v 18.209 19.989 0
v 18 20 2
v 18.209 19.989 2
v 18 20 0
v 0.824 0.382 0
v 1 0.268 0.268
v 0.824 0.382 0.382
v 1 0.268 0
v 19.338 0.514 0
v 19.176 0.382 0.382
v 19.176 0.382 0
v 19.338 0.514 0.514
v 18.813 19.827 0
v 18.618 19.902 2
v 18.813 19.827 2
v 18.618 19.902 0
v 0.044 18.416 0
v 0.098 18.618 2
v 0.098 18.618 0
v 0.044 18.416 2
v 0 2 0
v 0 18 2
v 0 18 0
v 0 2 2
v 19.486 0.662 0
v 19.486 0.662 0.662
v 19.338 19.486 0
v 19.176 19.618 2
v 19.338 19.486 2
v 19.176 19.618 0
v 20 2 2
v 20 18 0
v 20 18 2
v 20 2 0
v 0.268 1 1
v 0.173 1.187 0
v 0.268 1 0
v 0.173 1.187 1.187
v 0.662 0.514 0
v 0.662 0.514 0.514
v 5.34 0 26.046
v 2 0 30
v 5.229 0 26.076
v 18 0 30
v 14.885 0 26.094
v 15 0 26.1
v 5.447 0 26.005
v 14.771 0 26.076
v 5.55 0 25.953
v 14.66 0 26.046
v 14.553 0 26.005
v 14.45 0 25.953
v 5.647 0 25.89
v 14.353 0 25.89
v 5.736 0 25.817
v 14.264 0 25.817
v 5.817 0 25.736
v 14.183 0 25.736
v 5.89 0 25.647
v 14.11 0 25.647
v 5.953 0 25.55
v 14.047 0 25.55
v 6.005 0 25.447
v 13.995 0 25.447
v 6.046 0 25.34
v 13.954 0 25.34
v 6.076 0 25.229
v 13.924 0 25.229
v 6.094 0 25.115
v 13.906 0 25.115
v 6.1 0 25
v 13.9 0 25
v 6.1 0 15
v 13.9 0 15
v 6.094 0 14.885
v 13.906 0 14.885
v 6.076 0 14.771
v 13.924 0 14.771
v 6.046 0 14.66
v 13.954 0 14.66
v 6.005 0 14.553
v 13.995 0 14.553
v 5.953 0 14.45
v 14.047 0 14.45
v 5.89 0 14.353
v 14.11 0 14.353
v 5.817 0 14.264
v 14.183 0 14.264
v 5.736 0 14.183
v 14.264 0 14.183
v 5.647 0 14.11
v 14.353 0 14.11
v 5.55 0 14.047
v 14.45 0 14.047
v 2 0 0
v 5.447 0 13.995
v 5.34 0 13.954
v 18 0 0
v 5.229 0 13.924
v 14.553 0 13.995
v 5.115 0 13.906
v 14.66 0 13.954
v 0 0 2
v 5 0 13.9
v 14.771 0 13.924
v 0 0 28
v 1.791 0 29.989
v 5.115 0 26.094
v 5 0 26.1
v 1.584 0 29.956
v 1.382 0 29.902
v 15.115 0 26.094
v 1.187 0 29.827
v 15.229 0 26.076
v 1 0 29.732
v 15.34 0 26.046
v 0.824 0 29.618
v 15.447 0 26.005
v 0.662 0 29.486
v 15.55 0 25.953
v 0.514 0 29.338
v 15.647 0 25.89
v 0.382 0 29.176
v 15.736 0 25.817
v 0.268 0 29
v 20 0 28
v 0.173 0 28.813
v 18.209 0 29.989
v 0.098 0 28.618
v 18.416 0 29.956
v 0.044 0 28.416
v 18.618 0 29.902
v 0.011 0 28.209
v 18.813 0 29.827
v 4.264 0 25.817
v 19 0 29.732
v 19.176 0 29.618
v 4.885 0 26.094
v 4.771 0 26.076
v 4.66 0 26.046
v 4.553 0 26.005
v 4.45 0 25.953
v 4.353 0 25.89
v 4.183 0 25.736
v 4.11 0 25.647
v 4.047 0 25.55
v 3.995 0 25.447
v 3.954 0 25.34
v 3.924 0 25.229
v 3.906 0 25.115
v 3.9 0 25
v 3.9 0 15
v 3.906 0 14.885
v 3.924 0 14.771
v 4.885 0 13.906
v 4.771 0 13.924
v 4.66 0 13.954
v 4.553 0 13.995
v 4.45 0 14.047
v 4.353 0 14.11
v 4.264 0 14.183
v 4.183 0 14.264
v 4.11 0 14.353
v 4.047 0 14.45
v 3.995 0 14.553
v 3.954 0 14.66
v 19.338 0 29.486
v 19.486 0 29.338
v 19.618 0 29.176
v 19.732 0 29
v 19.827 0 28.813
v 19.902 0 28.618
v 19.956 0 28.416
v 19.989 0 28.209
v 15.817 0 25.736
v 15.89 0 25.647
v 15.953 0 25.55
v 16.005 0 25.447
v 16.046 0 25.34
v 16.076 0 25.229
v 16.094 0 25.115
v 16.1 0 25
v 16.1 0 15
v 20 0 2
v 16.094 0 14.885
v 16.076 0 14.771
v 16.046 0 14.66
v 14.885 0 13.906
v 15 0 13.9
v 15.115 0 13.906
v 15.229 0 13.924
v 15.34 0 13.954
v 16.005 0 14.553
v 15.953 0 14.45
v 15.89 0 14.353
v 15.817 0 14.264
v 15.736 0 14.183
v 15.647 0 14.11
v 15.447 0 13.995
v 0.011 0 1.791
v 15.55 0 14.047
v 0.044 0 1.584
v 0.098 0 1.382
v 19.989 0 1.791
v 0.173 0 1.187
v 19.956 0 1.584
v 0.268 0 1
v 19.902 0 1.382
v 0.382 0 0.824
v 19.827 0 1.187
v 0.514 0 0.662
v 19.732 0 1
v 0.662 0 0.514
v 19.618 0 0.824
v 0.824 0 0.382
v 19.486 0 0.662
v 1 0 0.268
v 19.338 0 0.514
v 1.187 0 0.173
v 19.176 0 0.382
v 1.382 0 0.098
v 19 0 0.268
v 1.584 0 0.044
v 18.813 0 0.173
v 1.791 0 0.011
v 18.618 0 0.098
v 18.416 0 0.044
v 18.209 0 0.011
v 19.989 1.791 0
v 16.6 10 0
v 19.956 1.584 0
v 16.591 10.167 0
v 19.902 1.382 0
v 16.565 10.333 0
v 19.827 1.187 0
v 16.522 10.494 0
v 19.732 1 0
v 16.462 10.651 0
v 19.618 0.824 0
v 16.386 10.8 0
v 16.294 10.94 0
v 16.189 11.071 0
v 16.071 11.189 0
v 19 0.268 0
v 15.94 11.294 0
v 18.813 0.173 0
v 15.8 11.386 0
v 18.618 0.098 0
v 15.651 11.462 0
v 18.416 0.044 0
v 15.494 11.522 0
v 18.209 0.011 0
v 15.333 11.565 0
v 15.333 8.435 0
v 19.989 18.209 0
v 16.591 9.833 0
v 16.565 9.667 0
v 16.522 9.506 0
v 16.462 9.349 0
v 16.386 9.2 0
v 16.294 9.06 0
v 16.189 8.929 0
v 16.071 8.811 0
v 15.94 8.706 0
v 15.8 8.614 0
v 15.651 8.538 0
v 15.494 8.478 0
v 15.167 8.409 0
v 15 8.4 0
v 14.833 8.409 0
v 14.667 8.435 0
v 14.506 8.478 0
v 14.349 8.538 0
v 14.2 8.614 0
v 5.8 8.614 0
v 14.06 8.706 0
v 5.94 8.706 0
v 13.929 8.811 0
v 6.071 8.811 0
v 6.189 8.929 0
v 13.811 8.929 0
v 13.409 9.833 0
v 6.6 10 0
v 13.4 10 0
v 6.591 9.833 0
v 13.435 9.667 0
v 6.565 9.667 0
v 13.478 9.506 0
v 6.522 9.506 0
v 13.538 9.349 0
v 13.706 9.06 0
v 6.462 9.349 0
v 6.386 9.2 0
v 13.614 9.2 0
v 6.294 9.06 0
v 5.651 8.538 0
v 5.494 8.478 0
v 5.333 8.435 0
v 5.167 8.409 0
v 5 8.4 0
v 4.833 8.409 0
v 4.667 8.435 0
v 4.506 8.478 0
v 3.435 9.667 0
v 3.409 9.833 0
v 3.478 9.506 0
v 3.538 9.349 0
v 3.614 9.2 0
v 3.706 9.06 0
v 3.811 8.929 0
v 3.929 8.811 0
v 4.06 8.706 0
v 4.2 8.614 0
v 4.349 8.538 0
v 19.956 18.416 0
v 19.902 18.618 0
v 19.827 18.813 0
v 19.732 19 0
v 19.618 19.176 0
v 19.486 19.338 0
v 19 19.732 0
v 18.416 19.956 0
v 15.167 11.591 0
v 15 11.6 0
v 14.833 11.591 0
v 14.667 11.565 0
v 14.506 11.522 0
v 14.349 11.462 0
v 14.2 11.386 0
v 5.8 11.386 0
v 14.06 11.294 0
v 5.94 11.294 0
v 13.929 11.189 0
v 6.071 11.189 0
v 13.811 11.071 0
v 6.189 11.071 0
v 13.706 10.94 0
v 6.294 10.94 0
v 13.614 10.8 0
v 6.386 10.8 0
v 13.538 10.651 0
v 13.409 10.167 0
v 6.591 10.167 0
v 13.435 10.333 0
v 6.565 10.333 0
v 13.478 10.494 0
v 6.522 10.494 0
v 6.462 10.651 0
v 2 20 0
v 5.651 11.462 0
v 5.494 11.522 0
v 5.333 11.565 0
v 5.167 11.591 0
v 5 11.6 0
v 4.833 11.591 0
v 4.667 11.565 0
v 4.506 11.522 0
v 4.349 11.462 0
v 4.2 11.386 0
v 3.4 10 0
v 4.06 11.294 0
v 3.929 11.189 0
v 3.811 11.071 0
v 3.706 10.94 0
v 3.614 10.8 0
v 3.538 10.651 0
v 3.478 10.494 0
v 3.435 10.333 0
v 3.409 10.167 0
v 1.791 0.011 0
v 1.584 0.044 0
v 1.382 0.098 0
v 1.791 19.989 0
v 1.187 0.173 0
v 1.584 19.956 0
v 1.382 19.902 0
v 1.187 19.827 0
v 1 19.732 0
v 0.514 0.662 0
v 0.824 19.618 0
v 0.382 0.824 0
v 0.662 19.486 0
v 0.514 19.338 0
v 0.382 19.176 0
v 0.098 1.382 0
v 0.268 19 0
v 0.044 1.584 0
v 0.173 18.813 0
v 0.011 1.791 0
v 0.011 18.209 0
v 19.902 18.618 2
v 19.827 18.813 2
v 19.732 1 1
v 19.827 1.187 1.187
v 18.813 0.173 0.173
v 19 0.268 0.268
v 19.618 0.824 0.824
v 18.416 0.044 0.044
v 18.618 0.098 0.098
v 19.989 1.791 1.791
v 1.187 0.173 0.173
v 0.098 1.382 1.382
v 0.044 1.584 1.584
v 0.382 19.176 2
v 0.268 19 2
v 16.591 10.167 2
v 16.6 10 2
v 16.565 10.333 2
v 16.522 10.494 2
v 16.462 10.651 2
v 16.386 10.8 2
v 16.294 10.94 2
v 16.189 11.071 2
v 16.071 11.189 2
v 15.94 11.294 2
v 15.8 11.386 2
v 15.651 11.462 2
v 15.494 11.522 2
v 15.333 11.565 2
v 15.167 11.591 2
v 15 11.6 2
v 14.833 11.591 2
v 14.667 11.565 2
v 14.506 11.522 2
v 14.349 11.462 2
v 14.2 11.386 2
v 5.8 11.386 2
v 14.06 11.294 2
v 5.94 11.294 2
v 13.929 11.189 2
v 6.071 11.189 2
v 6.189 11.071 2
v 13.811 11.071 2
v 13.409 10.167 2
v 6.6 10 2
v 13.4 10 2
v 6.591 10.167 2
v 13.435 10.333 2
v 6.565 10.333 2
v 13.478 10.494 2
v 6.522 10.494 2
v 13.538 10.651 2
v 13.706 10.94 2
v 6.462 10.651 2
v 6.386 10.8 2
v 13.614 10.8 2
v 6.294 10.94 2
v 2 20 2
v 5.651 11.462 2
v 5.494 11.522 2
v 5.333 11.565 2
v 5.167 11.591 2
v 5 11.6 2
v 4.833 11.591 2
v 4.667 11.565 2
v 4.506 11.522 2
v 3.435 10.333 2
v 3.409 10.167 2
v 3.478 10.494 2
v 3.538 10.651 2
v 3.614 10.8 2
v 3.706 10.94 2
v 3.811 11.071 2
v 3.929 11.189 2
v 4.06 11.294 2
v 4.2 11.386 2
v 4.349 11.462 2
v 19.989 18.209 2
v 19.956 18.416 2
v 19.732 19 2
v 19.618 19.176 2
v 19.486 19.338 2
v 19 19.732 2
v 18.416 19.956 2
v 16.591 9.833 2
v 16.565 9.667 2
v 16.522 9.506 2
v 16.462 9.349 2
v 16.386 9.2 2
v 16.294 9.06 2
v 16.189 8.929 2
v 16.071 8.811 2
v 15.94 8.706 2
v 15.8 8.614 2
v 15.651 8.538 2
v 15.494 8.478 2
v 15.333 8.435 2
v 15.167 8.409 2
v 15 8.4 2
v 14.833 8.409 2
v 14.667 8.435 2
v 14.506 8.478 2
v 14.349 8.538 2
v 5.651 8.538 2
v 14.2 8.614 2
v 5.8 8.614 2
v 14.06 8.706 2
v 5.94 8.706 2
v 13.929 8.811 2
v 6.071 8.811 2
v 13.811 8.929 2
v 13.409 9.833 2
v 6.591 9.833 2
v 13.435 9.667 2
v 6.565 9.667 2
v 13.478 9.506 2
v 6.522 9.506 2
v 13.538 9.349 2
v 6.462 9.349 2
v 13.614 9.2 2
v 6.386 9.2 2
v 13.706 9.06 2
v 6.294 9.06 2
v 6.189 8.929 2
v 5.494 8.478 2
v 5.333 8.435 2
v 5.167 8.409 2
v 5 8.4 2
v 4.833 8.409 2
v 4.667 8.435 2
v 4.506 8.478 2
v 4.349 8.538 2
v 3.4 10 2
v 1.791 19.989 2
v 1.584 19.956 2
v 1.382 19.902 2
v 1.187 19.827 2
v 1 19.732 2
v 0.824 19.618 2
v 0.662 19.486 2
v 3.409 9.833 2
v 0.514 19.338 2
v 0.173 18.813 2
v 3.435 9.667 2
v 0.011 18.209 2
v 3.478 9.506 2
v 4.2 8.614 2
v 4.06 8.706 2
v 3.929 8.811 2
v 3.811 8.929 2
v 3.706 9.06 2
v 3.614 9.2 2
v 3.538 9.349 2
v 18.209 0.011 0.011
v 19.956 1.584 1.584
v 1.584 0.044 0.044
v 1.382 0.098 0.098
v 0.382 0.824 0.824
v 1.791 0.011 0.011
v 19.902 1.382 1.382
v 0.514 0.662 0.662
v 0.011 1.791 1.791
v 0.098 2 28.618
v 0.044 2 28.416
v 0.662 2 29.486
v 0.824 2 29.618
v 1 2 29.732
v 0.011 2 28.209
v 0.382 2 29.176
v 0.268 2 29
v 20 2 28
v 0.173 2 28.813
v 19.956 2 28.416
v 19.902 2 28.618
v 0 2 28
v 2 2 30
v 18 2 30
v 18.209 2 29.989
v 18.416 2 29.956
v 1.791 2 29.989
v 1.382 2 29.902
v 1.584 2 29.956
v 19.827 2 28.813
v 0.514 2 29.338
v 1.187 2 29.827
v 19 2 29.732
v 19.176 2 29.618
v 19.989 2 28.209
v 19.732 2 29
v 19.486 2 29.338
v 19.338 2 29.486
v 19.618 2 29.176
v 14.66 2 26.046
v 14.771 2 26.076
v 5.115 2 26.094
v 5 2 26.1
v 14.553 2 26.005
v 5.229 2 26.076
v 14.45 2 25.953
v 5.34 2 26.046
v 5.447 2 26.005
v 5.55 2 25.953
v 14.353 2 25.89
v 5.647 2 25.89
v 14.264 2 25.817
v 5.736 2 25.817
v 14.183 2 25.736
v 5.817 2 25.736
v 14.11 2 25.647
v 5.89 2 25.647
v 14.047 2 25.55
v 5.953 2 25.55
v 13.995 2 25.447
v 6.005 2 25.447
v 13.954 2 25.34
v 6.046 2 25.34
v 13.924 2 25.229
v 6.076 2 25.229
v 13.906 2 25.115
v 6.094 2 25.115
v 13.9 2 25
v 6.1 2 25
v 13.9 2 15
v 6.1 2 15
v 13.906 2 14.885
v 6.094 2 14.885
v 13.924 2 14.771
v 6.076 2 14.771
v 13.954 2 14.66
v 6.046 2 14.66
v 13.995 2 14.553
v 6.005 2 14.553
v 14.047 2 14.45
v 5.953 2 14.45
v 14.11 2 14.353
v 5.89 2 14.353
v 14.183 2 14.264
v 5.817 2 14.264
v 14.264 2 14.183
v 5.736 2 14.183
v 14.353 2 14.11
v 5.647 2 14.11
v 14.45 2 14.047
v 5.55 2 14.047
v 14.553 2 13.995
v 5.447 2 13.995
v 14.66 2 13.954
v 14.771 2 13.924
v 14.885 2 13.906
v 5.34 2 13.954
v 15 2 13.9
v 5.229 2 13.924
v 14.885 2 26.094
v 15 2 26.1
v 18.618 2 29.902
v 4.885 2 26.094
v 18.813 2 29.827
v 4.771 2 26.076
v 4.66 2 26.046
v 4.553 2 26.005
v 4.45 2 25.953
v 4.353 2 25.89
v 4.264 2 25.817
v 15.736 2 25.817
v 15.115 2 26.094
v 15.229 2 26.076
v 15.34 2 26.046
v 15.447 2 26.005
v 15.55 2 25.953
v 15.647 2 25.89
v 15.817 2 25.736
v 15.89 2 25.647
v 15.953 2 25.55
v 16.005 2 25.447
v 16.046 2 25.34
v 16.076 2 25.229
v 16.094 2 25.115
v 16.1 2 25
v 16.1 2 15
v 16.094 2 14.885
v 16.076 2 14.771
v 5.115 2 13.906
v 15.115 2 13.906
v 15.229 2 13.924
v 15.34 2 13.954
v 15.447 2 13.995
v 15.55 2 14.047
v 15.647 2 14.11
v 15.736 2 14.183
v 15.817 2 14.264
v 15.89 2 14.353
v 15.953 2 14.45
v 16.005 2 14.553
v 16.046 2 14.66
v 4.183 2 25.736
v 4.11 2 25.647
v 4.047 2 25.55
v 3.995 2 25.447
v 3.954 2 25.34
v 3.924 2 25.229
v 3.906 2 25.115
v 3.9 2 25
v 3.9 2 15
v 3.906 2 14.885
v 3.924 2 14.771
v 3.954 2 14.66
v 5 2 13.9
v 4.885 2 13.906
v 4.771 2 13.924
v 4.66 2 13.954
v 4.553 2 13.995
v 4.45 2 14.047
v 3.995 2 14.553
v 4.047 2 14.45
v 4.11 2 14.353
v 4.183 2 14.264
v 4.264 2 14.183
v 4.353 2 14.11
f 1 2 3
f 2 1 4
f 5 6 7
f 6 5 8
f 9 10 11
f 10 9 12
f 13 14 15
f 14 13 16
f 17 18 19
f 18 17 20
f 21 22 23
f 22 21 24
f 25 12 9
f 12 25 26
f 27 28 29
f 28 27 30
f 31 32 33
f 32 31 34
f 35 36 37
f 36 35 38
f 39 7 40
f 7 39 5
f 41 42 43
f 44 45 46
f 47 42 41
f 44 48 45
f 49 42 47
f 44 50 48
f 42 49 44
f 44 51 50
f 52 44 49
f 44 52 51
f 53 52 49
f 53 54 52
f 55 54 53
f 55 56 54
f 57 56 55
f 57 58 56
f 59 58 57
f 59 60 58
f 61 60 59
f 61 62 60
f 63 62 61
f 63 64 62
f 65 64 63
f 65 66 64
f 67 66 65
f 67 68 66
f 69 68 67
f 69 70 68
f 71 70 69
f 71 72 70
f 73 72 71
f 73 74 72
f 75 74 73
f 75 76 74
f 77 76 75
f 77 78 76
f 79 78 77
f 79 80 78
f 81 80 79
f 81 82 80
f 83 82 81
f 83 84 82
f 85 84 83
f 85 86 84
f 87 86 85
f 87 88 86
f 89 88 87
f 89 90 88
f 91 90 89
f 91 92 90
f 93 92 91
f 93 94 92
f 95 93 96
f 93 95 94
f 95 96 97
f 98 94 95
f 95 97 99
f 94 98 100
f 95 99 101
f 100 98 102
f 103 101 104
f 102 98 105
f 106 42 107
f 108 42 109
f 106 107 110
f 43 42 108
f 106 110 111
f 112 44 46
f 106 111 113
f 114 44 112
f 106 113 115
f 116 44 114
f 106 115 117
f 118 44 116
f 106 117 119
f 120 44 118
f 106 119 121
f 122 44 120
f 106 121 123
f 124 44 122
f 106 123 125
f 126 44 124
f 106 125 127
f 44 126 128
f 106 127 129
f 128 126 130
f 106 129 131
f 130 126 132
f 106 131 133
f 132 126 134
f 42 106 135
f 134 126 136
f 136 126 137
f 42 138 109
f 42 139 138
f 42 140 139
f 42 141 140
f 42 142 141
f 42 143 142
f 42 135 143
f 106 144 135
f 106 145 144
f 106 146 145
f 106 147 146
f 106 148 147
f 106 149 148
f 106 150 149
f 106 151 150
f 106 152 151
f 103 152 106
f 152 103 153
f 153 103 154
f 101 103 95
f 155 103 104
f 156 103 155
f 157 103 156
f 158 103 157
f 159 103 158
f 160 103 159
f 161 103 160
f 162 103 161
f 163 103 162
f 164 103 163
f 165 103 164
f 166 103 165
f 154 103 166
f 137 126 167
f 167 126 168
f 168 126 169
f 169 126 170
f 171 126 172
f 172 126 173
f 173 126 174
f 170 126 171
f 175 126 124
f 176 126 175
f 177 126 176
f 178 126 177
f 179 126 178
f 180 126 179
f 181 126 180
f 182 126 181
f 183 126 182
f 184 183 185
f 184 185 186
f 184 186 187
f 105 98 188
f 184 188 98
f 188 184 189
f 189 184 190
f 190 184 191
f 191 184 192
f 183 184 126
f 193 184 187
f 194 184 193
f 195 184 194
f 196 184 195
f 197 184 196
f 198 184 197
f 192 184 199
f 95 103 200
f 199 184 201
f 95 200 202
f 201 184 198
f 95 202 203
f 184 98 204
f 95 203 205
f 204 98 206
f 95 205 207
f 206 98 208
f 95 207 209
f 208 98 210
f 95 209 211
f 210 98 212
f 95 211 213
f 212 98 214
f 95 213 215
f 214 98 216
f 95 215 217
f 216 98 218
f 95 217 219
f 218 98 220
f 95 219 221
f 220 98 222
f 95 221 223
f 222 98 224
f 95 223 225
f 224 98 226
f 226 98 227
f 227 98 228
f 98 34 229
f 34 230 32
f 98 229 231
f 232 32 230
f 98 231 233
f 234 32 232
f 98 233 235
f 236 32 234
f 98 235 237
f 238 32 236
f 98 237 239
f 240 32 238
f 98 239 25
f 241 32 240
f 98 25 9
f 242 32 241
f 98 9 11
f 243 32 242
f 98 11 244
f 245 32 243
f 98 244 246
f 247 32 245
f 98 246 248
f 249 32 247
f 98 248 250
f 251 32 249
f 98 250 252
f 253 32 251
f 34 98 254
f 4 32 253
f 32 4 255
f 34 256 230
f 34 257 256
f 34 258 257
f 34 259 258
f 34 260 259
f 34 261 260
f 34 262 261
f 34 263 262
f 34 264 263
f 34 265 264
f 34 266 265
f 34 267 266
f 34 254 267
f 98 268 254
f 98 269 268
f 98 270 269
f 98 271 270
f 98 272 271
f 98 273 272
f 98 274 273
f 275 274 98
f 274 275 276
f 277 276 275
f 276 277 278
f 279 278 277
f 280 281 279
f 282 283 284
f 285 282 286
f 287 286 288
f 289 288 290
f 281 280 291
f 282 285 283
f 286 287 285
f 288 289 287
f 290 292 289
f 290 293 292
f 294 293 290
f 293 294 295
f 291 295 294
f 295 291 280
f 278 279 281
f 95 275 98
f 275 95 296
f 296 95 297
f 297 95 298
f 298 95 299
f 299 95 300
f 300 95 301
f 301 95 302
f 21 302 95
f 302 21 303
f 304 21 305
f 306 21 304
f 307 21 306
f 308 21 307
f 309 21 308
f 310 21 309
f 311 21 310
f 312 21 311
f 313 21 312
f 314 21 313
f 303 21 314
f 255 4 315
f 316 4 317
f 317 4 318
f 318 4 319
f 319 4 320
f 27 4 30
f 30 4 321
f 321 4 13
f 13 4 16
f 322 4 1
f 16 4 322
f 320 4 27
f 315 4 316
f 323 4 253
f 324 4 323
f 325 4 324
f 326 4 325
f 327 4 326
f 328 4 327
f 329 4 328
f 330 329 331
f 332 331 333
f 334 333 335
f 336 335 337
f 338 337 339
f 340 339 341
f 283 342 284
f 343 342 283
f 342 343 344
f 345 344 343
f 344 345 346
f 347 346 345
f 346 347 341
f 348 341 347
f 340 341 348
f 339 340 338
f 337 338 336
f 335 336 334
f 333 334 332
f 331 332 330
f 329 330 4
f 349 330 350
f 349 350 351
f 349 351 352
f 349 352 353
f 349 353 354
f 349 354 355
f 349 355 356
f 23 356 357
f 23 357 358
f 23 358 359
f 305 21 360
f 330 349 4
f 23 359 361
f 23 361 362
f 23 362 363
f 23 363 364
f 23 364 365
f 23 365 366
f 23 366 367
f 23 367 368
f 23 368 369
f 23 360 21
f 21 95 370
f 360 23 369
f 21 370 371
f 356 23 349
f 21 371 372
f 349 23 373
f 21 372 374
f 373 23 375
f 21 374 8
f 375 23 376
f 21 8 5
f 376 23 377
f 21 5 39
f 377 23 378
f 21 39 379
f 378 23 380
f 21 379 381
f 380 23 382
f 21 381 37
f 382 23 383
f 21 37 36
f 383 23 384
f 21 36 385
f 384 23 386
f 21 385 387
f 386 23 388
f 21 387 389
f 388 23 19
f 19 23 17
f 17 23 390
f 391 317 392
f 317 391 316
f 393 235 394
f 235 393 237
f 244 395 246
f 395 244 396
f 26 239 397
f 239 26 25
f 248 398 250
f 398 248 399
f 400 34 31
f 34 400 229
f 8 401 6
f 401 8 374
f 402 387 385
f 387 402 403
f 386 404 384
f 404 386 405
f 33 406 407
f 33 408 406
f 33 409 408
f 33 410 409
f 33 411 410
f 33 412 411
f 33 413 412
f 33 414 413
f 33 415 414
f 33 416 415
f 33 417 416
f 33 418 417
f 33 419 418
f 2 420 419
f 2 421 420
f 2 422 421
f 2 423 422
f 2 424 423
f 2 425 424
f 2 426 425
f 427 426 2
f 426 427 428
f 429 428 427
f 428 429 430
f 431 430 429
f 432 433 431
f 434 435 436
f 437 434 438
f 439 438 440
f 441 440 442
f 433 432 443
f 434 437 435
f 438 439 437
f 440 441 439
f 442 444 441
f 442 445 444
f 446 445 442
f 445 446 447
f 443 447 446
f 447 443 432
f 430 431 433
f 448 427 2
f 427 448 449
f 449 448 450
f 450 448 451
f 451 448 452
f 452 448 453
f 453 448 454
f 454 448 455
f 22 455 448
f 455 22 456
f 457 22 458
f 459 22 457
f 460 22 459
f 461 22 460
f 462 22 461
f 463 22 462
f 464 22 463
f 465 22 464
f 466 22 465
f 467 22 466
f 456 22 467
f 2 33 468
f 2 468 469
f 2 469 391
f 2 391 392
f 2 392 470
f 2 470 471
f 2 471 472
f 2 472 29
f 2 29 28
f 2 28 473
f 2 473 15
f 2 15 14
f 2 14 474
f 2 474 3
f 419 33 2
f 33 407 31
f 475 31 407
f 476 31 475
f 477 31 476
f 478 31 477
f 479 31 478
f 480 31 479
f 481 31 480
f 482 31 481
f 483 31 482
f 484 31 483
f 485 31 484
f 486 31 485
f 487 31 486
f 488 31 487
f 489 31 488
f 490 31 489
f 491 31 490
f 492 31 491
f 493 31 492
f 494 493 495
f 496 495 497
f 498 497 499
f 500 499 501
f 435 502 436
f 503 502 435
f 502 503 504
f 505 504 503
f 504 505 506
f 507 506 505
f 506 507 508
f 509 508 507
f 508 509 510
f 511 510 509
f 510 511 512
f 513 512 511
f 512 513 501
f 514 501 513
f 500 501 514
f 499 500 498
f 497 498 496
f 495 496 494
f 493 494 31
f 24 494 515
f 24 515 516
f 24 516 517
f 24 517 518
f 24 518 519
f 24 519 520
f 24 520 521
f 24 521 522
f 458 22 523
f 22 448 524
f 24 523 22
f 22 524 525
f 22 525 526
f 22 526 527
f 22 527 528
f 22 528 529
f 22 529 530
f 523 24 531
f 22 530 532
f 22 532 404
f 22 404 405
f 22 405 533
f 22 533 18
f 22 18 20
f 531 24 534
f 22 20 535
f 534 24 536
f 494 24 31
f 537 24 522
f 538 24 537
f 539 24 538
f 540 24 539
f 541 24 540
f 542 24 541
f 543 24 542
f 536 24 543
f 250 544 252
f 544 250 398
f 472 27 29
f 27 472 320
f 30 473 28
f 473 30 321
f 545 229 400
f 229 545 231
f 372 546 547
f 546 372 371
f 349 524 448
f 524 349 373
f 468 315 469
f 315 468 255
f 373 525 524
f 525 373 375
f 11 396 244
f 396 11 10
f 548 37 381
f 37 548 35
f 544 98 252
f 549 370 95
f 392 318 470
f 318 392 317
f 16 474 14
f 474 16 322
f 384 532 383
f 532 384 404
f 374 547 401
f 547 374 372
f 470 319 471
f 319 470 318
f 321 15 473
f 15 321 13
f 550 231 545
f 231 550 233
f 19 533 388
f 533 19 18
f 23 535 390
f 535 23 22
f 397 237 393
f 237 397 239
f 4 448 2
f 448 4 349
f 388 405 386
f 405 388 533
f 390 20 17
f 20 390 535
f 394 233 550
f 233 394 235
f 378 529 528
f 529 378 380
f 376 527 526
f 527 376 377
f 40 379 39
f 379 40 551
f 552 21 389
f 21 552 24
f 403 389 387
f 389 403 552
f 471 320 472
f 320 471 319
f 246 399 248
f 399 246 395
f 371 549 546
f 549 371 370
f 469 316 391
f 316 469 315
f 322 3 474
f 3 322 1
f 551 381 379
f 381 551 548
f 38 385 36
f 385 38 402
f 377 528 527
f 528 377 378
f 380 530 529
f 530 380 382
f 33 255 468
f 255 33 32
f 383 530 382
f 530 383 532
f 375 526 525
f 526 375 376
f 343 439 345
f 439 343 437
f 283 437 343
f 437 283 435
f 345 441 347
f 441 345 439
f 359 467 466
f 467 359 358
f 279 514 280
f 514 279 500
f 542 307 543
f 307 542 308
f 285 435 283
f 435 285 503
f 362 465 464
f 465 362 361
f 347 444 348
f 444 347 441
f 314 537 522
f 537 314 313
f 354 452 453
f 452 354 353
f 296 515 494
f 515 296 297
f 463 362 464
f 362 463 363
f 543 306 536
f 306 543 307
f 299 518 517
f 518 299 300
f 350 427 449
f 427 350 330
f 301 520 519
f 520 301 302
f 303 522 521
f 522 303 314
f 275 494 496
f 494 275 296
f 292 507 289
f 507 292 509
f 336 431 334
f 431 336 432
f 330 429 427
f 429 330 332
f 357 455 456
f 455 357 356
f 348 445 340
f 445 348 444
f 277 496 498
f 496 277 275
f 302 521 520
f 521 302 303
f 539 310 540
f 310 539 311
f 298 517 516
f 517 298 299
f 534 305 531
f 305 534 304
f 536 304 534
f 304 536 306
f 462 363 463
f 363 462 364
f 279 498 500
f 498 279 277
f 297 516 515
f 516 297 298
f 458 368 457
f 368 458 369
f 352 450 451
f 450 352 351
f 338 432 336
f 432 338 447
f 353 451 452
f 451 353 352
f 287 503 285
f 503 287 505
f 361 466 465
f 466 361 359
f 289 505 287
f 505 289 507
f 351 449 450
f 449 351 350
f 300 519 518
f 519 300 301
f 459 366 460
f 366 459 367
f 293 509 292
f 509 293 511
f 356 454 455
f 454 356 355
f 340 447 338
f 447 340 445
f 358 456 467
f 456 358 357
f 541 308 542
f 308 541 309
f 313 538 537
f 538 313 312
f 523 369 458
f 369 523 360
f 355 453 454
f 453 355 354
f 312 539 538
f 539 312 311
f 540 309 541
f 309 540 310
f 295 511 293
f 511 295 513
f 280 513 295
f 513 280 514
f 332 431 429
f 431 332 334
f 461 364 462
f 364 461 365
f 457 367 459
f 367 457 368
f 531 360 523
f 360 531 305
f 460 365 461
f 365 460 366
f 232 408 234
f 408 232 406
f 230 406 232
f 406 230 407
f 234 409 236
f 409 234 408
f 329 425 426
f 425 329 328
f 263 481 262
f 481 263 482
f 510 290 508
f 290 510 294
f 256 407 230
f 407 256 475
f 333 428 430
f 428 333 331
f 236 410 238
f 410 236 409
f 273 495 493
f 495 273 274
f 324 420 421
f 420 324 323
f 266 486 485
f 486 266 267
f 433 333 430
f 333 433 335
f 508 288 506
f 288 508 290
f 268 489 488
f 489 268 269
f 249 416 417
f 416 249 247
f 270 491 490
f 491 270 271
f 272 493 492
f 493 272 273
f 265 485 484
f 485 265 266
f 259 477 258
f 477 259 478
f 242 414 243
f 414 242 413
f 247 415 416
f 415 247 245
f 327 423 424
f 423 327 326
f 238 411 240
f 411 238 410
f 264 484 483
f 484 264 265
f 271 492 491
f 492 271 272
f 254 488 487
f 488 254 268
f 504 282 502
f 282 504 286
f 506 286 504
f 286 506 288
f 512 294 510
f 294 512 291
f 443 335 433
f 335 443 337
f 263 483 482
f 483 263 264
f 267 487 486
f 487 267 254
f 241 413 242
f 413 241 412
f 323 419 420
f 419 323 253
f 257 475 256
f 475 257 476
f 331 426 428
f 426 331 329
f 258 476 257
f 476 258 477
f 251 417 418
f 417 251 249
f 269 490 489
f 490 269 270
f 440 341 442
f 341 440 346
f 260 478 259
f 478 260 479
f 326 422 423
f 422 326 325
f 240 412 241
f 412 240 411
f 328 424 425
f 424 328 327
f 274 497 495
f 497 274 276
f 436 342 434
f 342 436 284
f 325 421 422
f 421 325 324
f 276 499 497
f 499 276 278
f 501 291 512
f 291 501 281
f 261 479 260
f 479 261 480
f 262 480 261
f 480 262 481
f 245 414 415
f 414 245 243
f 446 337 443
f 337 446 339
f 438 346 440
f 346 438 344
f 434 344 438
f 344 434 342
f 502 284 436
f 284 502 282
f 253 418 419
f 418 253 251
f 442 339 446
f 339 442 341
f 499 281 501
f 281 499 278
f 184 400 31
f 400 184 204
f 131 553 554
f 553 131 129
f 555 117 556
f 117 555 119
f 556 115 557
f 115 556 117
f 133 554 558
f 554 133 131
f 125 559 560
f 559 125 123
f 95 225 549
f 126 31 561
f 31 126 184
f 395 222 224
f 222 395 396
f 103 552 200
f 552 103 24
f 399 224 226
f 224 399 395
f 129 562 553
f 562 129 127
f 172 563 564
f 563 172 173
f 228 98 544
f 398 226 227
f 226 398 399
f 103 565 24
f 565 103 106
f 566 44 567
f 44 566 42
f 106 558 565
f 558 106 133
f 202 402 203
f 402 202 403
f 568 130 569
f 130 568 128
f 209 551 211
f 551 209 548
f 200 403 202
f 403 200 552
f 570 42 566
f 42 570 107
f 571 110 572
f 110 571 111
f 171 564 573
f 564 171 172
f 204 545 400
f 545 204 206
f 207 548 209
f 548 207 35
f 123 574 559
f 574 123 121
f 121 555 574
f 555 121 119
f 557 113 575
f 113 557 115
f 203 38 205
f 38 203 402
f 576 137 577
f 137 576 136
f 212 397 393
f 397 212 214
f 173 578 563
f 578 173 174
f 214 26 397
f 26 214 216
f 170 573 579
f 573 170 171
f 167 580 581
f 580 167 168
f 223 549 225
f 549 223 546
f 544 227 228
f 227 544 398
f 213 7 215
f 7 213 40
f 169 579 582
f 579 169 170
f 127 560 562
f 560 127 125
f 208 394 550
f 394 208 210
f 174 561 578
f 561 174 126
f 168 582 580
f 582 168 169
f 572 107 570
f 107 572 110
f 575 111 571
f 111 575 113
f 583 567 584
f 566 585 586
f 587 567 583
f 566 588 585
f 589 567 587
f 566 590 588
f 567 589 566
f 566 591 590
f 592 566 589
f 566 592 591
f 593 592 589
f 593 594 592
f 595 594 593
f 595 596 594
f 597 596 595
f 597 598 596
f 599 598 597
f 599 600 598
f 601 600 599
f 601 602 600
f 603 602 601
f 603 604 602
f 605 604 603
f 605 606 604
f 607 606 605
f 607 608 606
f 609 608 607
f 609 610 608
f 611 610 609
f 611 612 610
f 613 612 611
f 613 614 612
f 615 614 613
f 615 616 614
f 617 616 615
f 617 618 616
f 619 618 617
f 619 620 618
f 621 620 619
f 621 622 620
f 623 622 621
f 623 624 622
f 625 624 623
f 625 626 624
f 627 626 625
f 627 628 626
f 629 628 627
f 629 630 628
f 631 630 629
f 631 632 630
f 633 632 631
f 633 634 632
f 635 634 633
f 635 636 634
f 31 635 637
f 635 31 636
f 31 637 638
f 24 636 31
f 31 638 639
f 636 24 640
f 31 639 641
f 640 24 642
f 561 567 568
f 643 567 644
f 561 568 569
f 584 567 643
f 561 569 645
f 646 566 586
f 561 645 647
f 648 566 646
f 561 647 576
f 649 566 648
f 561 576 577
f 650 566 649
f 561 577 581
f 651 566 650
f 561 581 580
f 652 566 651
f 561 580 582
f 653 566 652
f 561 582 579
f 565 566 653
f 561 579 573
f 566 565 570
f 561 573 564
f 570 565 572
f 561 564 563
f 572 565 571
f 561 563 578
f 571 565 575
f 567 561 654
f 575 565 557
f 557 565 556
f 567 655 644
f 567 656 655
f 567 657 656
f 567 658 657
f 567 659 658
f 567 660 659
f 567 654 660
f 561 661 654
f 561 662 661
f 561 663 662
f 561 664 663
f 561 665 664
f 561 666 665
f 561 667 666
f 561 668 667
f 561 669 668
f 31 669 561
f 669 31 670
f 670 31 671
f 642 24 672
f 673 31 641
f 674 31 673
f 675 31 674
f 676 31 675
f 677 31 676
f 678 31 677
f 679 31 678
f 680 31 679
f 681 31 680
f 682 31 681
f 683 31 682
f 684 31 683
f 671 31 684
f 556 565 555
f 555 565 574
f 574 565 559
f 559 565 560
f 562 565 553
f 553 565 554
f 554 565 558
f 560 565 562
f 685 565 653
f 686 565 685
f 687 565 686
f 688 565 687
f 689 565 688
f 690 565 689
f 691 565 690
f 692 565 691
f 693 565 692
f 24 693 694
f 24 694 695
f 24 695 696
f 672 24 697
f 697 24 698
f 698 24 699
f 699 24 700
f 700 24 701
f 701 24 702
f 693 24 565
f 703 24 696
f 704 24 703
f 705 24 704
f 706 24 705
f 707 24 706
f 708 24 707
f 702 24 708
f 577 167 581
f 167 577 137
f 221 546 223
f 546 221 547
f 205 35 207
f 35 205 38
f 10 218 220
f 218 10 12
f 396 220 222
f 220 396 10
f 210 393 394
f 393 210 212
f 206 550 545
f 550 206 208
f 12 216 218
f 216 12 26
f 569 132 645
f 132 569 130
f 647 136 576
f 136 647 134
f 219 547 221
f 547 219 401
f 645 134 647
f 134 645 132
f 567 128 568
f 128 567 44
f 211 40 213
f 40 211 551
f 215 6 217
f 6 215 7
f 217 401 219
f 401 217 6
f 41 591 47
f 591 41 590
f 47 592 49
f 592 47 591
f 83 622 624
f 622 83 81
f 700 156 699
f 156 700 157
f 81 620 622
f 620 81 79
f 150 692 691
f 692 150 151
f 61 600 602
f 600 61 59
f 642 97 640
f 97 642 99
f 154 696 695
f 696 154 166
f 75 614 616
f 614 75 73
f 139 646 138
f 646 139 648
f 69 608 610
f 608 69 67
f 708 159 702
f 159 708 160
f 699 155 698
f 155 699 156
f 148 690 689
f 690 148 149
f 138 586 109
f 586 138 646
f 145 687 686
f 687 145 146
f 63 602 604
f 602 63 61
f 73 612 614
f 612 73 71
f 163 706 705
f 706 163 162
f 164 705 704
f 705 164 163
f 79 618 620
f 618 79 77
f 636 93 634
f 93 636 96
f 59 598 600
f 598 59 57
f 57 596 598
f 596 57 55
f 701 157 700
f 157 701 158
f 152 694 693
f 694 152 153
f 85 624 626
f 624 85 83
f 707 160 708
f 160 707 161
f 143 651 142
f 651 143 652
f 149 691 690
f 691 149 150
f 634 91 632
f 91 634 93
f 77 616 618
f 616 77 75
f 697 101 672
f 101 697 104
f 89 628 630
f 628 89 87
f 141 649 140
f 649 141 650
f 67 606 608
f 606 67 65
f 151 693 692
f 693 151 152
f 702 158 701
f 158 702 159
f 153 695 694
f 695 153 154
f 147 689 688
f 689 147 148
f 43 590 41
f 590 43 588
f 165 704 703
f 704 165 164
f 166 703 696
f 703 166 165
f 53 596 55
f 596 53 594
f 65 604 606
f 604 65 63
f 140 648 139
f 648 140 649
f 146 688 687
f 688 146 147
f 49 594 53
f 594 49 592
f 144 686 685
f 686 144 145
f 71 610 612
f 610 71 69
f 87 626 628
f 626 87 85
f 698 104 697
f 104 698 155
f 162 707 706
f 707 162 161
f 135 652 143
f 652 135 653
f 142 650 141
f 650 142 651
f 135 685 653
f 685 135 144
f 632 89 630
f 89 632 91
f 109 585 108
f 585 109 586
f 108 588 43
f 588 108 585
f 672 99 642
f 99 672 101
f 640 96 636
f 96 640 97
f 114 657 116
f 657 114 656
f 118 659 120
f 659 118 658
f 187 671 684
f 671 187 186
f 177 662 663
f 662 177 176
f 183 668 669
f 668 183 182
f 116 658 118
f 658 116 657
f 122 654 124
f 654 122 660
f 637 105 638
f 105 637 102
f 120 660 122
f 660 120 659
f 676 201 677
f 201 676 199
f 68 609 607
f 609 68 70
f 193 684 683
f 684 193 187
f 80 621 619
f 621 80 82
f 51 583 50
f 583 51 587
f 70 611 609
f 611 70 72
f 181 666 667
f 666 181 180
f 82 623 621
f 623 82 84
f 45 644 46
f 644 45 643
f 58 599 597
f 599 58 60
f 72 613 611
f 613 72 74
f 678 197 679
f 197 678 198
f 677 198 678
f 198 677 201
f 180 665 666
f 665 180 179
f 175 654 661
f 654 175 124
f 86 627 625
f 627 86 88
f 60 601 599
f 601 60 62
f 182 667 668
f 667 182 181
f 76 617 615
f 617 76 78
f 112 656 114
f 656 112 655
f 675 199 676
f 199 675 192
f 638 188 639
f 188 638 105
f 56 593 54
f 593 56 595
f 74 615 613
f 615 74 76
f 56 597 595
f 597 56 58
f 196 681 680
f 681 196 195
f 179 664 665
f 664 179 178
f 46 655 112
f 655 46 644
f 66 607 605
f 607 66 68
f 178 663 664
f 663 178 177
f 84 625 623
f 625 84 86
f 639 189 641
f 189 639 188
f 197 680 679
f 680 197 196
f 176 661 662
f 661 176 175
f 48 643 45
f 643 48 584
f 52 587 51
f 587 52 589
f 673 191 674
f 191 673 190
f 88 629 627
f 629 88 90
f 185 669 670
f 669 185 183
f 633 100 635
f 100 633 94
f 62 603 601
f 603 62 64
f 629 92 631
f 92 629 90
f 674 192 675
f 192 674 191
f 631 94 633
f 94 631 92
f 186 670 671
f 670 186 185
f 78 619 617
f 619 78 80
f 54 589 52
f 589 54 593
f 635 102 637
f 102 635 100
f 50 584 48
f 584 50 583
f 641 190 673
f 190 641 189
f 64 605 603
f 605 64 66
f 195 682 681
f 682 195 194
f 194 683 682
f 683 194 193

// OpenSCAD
// Customizable endstop bracket by Cees Moerkerken
// http://www.thingiverse.com/thing:1523711
// v1.0 - 27-04-2016
// preview[view:north, tilt:top]

//CUSTOMIZER VARIABLES

/* [General_dimensions] */
// Thickness of the bracket in mm
thickness=2;
// Width of the bracket
width=20;

/* [Side1_dimensions] */
// Length of the part 
L1=20;
// Distance between the center of the bolts
frame_bolt_space=10;
// Bolt diameter incl margin (m3 = 3.2mm printed)
frame_bolt_d=3.2;// [2.2,3.2,4.2,5.2,6.2]

/* [Side2_dimensions] */
// Length of the part 
L2=30;
// Distance between the center of the bolts
endstop_bolt_space=10;
// Bolt diameter
endstop_bolt_d=2.2;
// Start of the endstop bolt hull on Side 2
endstop_mount_start=15;// [3:45]
// End of the endstop bolt hull on Side 2
endstop_mount_end=25;// [3:45]

//CUSTOMIZER VARIABLES END

/* [Hidden] */
$fn=60;

difference(){
    translate([2,2,0])minkowski(){
        cube([width-4,L1-4,thickness/2]);
        cylinder(r=2,h=thickness/2);
    }
    translate([width/2-frame_bolt_space/2,L1/2,-.1])cylinder(d=frame_bolt_d,h=thickness+.2);
    translate([width/2+frame_bolt_space/2,L1/2,-.1])cylinder(d=frame_bolt_d,h=thickness+.2);
}
difference(){
    translate([2,thickness/2,2])minkowski(){
        cube([width-4,thickness/2,L2-4]);
        rotate([90,0,0])cylinder(r=2,h=thickness/2);
    }
    hull(){
        translate([width/2-endstop_bolt_space/2,thickness+.1,endstop_mount_start])rotate([90,0,0])cylinder(d=endstop_bolt_d, h=thickness+.2);
        translate([width/2-endstop_bolt_space/2,thickness+.1,endstop_mount_end])rotate([90,0,0])cylinder(d=endstop_bolt_d, h=thickness+.2);
    }
    hull(){
        translate([width/2+endstop_bolt_space/2,thickness+.1,endstop_mount_start])rotate([90,0,0])cylinder(d=endstop_bolt_d, h=thickness+.2);
        translate([width/2+endstop_bolt_space/2,thickness+.1,endstop_mount_end])rotate([90,0,0])cylinder(d=endstop_bolt_d, h=thickness+.2);
    }
}
